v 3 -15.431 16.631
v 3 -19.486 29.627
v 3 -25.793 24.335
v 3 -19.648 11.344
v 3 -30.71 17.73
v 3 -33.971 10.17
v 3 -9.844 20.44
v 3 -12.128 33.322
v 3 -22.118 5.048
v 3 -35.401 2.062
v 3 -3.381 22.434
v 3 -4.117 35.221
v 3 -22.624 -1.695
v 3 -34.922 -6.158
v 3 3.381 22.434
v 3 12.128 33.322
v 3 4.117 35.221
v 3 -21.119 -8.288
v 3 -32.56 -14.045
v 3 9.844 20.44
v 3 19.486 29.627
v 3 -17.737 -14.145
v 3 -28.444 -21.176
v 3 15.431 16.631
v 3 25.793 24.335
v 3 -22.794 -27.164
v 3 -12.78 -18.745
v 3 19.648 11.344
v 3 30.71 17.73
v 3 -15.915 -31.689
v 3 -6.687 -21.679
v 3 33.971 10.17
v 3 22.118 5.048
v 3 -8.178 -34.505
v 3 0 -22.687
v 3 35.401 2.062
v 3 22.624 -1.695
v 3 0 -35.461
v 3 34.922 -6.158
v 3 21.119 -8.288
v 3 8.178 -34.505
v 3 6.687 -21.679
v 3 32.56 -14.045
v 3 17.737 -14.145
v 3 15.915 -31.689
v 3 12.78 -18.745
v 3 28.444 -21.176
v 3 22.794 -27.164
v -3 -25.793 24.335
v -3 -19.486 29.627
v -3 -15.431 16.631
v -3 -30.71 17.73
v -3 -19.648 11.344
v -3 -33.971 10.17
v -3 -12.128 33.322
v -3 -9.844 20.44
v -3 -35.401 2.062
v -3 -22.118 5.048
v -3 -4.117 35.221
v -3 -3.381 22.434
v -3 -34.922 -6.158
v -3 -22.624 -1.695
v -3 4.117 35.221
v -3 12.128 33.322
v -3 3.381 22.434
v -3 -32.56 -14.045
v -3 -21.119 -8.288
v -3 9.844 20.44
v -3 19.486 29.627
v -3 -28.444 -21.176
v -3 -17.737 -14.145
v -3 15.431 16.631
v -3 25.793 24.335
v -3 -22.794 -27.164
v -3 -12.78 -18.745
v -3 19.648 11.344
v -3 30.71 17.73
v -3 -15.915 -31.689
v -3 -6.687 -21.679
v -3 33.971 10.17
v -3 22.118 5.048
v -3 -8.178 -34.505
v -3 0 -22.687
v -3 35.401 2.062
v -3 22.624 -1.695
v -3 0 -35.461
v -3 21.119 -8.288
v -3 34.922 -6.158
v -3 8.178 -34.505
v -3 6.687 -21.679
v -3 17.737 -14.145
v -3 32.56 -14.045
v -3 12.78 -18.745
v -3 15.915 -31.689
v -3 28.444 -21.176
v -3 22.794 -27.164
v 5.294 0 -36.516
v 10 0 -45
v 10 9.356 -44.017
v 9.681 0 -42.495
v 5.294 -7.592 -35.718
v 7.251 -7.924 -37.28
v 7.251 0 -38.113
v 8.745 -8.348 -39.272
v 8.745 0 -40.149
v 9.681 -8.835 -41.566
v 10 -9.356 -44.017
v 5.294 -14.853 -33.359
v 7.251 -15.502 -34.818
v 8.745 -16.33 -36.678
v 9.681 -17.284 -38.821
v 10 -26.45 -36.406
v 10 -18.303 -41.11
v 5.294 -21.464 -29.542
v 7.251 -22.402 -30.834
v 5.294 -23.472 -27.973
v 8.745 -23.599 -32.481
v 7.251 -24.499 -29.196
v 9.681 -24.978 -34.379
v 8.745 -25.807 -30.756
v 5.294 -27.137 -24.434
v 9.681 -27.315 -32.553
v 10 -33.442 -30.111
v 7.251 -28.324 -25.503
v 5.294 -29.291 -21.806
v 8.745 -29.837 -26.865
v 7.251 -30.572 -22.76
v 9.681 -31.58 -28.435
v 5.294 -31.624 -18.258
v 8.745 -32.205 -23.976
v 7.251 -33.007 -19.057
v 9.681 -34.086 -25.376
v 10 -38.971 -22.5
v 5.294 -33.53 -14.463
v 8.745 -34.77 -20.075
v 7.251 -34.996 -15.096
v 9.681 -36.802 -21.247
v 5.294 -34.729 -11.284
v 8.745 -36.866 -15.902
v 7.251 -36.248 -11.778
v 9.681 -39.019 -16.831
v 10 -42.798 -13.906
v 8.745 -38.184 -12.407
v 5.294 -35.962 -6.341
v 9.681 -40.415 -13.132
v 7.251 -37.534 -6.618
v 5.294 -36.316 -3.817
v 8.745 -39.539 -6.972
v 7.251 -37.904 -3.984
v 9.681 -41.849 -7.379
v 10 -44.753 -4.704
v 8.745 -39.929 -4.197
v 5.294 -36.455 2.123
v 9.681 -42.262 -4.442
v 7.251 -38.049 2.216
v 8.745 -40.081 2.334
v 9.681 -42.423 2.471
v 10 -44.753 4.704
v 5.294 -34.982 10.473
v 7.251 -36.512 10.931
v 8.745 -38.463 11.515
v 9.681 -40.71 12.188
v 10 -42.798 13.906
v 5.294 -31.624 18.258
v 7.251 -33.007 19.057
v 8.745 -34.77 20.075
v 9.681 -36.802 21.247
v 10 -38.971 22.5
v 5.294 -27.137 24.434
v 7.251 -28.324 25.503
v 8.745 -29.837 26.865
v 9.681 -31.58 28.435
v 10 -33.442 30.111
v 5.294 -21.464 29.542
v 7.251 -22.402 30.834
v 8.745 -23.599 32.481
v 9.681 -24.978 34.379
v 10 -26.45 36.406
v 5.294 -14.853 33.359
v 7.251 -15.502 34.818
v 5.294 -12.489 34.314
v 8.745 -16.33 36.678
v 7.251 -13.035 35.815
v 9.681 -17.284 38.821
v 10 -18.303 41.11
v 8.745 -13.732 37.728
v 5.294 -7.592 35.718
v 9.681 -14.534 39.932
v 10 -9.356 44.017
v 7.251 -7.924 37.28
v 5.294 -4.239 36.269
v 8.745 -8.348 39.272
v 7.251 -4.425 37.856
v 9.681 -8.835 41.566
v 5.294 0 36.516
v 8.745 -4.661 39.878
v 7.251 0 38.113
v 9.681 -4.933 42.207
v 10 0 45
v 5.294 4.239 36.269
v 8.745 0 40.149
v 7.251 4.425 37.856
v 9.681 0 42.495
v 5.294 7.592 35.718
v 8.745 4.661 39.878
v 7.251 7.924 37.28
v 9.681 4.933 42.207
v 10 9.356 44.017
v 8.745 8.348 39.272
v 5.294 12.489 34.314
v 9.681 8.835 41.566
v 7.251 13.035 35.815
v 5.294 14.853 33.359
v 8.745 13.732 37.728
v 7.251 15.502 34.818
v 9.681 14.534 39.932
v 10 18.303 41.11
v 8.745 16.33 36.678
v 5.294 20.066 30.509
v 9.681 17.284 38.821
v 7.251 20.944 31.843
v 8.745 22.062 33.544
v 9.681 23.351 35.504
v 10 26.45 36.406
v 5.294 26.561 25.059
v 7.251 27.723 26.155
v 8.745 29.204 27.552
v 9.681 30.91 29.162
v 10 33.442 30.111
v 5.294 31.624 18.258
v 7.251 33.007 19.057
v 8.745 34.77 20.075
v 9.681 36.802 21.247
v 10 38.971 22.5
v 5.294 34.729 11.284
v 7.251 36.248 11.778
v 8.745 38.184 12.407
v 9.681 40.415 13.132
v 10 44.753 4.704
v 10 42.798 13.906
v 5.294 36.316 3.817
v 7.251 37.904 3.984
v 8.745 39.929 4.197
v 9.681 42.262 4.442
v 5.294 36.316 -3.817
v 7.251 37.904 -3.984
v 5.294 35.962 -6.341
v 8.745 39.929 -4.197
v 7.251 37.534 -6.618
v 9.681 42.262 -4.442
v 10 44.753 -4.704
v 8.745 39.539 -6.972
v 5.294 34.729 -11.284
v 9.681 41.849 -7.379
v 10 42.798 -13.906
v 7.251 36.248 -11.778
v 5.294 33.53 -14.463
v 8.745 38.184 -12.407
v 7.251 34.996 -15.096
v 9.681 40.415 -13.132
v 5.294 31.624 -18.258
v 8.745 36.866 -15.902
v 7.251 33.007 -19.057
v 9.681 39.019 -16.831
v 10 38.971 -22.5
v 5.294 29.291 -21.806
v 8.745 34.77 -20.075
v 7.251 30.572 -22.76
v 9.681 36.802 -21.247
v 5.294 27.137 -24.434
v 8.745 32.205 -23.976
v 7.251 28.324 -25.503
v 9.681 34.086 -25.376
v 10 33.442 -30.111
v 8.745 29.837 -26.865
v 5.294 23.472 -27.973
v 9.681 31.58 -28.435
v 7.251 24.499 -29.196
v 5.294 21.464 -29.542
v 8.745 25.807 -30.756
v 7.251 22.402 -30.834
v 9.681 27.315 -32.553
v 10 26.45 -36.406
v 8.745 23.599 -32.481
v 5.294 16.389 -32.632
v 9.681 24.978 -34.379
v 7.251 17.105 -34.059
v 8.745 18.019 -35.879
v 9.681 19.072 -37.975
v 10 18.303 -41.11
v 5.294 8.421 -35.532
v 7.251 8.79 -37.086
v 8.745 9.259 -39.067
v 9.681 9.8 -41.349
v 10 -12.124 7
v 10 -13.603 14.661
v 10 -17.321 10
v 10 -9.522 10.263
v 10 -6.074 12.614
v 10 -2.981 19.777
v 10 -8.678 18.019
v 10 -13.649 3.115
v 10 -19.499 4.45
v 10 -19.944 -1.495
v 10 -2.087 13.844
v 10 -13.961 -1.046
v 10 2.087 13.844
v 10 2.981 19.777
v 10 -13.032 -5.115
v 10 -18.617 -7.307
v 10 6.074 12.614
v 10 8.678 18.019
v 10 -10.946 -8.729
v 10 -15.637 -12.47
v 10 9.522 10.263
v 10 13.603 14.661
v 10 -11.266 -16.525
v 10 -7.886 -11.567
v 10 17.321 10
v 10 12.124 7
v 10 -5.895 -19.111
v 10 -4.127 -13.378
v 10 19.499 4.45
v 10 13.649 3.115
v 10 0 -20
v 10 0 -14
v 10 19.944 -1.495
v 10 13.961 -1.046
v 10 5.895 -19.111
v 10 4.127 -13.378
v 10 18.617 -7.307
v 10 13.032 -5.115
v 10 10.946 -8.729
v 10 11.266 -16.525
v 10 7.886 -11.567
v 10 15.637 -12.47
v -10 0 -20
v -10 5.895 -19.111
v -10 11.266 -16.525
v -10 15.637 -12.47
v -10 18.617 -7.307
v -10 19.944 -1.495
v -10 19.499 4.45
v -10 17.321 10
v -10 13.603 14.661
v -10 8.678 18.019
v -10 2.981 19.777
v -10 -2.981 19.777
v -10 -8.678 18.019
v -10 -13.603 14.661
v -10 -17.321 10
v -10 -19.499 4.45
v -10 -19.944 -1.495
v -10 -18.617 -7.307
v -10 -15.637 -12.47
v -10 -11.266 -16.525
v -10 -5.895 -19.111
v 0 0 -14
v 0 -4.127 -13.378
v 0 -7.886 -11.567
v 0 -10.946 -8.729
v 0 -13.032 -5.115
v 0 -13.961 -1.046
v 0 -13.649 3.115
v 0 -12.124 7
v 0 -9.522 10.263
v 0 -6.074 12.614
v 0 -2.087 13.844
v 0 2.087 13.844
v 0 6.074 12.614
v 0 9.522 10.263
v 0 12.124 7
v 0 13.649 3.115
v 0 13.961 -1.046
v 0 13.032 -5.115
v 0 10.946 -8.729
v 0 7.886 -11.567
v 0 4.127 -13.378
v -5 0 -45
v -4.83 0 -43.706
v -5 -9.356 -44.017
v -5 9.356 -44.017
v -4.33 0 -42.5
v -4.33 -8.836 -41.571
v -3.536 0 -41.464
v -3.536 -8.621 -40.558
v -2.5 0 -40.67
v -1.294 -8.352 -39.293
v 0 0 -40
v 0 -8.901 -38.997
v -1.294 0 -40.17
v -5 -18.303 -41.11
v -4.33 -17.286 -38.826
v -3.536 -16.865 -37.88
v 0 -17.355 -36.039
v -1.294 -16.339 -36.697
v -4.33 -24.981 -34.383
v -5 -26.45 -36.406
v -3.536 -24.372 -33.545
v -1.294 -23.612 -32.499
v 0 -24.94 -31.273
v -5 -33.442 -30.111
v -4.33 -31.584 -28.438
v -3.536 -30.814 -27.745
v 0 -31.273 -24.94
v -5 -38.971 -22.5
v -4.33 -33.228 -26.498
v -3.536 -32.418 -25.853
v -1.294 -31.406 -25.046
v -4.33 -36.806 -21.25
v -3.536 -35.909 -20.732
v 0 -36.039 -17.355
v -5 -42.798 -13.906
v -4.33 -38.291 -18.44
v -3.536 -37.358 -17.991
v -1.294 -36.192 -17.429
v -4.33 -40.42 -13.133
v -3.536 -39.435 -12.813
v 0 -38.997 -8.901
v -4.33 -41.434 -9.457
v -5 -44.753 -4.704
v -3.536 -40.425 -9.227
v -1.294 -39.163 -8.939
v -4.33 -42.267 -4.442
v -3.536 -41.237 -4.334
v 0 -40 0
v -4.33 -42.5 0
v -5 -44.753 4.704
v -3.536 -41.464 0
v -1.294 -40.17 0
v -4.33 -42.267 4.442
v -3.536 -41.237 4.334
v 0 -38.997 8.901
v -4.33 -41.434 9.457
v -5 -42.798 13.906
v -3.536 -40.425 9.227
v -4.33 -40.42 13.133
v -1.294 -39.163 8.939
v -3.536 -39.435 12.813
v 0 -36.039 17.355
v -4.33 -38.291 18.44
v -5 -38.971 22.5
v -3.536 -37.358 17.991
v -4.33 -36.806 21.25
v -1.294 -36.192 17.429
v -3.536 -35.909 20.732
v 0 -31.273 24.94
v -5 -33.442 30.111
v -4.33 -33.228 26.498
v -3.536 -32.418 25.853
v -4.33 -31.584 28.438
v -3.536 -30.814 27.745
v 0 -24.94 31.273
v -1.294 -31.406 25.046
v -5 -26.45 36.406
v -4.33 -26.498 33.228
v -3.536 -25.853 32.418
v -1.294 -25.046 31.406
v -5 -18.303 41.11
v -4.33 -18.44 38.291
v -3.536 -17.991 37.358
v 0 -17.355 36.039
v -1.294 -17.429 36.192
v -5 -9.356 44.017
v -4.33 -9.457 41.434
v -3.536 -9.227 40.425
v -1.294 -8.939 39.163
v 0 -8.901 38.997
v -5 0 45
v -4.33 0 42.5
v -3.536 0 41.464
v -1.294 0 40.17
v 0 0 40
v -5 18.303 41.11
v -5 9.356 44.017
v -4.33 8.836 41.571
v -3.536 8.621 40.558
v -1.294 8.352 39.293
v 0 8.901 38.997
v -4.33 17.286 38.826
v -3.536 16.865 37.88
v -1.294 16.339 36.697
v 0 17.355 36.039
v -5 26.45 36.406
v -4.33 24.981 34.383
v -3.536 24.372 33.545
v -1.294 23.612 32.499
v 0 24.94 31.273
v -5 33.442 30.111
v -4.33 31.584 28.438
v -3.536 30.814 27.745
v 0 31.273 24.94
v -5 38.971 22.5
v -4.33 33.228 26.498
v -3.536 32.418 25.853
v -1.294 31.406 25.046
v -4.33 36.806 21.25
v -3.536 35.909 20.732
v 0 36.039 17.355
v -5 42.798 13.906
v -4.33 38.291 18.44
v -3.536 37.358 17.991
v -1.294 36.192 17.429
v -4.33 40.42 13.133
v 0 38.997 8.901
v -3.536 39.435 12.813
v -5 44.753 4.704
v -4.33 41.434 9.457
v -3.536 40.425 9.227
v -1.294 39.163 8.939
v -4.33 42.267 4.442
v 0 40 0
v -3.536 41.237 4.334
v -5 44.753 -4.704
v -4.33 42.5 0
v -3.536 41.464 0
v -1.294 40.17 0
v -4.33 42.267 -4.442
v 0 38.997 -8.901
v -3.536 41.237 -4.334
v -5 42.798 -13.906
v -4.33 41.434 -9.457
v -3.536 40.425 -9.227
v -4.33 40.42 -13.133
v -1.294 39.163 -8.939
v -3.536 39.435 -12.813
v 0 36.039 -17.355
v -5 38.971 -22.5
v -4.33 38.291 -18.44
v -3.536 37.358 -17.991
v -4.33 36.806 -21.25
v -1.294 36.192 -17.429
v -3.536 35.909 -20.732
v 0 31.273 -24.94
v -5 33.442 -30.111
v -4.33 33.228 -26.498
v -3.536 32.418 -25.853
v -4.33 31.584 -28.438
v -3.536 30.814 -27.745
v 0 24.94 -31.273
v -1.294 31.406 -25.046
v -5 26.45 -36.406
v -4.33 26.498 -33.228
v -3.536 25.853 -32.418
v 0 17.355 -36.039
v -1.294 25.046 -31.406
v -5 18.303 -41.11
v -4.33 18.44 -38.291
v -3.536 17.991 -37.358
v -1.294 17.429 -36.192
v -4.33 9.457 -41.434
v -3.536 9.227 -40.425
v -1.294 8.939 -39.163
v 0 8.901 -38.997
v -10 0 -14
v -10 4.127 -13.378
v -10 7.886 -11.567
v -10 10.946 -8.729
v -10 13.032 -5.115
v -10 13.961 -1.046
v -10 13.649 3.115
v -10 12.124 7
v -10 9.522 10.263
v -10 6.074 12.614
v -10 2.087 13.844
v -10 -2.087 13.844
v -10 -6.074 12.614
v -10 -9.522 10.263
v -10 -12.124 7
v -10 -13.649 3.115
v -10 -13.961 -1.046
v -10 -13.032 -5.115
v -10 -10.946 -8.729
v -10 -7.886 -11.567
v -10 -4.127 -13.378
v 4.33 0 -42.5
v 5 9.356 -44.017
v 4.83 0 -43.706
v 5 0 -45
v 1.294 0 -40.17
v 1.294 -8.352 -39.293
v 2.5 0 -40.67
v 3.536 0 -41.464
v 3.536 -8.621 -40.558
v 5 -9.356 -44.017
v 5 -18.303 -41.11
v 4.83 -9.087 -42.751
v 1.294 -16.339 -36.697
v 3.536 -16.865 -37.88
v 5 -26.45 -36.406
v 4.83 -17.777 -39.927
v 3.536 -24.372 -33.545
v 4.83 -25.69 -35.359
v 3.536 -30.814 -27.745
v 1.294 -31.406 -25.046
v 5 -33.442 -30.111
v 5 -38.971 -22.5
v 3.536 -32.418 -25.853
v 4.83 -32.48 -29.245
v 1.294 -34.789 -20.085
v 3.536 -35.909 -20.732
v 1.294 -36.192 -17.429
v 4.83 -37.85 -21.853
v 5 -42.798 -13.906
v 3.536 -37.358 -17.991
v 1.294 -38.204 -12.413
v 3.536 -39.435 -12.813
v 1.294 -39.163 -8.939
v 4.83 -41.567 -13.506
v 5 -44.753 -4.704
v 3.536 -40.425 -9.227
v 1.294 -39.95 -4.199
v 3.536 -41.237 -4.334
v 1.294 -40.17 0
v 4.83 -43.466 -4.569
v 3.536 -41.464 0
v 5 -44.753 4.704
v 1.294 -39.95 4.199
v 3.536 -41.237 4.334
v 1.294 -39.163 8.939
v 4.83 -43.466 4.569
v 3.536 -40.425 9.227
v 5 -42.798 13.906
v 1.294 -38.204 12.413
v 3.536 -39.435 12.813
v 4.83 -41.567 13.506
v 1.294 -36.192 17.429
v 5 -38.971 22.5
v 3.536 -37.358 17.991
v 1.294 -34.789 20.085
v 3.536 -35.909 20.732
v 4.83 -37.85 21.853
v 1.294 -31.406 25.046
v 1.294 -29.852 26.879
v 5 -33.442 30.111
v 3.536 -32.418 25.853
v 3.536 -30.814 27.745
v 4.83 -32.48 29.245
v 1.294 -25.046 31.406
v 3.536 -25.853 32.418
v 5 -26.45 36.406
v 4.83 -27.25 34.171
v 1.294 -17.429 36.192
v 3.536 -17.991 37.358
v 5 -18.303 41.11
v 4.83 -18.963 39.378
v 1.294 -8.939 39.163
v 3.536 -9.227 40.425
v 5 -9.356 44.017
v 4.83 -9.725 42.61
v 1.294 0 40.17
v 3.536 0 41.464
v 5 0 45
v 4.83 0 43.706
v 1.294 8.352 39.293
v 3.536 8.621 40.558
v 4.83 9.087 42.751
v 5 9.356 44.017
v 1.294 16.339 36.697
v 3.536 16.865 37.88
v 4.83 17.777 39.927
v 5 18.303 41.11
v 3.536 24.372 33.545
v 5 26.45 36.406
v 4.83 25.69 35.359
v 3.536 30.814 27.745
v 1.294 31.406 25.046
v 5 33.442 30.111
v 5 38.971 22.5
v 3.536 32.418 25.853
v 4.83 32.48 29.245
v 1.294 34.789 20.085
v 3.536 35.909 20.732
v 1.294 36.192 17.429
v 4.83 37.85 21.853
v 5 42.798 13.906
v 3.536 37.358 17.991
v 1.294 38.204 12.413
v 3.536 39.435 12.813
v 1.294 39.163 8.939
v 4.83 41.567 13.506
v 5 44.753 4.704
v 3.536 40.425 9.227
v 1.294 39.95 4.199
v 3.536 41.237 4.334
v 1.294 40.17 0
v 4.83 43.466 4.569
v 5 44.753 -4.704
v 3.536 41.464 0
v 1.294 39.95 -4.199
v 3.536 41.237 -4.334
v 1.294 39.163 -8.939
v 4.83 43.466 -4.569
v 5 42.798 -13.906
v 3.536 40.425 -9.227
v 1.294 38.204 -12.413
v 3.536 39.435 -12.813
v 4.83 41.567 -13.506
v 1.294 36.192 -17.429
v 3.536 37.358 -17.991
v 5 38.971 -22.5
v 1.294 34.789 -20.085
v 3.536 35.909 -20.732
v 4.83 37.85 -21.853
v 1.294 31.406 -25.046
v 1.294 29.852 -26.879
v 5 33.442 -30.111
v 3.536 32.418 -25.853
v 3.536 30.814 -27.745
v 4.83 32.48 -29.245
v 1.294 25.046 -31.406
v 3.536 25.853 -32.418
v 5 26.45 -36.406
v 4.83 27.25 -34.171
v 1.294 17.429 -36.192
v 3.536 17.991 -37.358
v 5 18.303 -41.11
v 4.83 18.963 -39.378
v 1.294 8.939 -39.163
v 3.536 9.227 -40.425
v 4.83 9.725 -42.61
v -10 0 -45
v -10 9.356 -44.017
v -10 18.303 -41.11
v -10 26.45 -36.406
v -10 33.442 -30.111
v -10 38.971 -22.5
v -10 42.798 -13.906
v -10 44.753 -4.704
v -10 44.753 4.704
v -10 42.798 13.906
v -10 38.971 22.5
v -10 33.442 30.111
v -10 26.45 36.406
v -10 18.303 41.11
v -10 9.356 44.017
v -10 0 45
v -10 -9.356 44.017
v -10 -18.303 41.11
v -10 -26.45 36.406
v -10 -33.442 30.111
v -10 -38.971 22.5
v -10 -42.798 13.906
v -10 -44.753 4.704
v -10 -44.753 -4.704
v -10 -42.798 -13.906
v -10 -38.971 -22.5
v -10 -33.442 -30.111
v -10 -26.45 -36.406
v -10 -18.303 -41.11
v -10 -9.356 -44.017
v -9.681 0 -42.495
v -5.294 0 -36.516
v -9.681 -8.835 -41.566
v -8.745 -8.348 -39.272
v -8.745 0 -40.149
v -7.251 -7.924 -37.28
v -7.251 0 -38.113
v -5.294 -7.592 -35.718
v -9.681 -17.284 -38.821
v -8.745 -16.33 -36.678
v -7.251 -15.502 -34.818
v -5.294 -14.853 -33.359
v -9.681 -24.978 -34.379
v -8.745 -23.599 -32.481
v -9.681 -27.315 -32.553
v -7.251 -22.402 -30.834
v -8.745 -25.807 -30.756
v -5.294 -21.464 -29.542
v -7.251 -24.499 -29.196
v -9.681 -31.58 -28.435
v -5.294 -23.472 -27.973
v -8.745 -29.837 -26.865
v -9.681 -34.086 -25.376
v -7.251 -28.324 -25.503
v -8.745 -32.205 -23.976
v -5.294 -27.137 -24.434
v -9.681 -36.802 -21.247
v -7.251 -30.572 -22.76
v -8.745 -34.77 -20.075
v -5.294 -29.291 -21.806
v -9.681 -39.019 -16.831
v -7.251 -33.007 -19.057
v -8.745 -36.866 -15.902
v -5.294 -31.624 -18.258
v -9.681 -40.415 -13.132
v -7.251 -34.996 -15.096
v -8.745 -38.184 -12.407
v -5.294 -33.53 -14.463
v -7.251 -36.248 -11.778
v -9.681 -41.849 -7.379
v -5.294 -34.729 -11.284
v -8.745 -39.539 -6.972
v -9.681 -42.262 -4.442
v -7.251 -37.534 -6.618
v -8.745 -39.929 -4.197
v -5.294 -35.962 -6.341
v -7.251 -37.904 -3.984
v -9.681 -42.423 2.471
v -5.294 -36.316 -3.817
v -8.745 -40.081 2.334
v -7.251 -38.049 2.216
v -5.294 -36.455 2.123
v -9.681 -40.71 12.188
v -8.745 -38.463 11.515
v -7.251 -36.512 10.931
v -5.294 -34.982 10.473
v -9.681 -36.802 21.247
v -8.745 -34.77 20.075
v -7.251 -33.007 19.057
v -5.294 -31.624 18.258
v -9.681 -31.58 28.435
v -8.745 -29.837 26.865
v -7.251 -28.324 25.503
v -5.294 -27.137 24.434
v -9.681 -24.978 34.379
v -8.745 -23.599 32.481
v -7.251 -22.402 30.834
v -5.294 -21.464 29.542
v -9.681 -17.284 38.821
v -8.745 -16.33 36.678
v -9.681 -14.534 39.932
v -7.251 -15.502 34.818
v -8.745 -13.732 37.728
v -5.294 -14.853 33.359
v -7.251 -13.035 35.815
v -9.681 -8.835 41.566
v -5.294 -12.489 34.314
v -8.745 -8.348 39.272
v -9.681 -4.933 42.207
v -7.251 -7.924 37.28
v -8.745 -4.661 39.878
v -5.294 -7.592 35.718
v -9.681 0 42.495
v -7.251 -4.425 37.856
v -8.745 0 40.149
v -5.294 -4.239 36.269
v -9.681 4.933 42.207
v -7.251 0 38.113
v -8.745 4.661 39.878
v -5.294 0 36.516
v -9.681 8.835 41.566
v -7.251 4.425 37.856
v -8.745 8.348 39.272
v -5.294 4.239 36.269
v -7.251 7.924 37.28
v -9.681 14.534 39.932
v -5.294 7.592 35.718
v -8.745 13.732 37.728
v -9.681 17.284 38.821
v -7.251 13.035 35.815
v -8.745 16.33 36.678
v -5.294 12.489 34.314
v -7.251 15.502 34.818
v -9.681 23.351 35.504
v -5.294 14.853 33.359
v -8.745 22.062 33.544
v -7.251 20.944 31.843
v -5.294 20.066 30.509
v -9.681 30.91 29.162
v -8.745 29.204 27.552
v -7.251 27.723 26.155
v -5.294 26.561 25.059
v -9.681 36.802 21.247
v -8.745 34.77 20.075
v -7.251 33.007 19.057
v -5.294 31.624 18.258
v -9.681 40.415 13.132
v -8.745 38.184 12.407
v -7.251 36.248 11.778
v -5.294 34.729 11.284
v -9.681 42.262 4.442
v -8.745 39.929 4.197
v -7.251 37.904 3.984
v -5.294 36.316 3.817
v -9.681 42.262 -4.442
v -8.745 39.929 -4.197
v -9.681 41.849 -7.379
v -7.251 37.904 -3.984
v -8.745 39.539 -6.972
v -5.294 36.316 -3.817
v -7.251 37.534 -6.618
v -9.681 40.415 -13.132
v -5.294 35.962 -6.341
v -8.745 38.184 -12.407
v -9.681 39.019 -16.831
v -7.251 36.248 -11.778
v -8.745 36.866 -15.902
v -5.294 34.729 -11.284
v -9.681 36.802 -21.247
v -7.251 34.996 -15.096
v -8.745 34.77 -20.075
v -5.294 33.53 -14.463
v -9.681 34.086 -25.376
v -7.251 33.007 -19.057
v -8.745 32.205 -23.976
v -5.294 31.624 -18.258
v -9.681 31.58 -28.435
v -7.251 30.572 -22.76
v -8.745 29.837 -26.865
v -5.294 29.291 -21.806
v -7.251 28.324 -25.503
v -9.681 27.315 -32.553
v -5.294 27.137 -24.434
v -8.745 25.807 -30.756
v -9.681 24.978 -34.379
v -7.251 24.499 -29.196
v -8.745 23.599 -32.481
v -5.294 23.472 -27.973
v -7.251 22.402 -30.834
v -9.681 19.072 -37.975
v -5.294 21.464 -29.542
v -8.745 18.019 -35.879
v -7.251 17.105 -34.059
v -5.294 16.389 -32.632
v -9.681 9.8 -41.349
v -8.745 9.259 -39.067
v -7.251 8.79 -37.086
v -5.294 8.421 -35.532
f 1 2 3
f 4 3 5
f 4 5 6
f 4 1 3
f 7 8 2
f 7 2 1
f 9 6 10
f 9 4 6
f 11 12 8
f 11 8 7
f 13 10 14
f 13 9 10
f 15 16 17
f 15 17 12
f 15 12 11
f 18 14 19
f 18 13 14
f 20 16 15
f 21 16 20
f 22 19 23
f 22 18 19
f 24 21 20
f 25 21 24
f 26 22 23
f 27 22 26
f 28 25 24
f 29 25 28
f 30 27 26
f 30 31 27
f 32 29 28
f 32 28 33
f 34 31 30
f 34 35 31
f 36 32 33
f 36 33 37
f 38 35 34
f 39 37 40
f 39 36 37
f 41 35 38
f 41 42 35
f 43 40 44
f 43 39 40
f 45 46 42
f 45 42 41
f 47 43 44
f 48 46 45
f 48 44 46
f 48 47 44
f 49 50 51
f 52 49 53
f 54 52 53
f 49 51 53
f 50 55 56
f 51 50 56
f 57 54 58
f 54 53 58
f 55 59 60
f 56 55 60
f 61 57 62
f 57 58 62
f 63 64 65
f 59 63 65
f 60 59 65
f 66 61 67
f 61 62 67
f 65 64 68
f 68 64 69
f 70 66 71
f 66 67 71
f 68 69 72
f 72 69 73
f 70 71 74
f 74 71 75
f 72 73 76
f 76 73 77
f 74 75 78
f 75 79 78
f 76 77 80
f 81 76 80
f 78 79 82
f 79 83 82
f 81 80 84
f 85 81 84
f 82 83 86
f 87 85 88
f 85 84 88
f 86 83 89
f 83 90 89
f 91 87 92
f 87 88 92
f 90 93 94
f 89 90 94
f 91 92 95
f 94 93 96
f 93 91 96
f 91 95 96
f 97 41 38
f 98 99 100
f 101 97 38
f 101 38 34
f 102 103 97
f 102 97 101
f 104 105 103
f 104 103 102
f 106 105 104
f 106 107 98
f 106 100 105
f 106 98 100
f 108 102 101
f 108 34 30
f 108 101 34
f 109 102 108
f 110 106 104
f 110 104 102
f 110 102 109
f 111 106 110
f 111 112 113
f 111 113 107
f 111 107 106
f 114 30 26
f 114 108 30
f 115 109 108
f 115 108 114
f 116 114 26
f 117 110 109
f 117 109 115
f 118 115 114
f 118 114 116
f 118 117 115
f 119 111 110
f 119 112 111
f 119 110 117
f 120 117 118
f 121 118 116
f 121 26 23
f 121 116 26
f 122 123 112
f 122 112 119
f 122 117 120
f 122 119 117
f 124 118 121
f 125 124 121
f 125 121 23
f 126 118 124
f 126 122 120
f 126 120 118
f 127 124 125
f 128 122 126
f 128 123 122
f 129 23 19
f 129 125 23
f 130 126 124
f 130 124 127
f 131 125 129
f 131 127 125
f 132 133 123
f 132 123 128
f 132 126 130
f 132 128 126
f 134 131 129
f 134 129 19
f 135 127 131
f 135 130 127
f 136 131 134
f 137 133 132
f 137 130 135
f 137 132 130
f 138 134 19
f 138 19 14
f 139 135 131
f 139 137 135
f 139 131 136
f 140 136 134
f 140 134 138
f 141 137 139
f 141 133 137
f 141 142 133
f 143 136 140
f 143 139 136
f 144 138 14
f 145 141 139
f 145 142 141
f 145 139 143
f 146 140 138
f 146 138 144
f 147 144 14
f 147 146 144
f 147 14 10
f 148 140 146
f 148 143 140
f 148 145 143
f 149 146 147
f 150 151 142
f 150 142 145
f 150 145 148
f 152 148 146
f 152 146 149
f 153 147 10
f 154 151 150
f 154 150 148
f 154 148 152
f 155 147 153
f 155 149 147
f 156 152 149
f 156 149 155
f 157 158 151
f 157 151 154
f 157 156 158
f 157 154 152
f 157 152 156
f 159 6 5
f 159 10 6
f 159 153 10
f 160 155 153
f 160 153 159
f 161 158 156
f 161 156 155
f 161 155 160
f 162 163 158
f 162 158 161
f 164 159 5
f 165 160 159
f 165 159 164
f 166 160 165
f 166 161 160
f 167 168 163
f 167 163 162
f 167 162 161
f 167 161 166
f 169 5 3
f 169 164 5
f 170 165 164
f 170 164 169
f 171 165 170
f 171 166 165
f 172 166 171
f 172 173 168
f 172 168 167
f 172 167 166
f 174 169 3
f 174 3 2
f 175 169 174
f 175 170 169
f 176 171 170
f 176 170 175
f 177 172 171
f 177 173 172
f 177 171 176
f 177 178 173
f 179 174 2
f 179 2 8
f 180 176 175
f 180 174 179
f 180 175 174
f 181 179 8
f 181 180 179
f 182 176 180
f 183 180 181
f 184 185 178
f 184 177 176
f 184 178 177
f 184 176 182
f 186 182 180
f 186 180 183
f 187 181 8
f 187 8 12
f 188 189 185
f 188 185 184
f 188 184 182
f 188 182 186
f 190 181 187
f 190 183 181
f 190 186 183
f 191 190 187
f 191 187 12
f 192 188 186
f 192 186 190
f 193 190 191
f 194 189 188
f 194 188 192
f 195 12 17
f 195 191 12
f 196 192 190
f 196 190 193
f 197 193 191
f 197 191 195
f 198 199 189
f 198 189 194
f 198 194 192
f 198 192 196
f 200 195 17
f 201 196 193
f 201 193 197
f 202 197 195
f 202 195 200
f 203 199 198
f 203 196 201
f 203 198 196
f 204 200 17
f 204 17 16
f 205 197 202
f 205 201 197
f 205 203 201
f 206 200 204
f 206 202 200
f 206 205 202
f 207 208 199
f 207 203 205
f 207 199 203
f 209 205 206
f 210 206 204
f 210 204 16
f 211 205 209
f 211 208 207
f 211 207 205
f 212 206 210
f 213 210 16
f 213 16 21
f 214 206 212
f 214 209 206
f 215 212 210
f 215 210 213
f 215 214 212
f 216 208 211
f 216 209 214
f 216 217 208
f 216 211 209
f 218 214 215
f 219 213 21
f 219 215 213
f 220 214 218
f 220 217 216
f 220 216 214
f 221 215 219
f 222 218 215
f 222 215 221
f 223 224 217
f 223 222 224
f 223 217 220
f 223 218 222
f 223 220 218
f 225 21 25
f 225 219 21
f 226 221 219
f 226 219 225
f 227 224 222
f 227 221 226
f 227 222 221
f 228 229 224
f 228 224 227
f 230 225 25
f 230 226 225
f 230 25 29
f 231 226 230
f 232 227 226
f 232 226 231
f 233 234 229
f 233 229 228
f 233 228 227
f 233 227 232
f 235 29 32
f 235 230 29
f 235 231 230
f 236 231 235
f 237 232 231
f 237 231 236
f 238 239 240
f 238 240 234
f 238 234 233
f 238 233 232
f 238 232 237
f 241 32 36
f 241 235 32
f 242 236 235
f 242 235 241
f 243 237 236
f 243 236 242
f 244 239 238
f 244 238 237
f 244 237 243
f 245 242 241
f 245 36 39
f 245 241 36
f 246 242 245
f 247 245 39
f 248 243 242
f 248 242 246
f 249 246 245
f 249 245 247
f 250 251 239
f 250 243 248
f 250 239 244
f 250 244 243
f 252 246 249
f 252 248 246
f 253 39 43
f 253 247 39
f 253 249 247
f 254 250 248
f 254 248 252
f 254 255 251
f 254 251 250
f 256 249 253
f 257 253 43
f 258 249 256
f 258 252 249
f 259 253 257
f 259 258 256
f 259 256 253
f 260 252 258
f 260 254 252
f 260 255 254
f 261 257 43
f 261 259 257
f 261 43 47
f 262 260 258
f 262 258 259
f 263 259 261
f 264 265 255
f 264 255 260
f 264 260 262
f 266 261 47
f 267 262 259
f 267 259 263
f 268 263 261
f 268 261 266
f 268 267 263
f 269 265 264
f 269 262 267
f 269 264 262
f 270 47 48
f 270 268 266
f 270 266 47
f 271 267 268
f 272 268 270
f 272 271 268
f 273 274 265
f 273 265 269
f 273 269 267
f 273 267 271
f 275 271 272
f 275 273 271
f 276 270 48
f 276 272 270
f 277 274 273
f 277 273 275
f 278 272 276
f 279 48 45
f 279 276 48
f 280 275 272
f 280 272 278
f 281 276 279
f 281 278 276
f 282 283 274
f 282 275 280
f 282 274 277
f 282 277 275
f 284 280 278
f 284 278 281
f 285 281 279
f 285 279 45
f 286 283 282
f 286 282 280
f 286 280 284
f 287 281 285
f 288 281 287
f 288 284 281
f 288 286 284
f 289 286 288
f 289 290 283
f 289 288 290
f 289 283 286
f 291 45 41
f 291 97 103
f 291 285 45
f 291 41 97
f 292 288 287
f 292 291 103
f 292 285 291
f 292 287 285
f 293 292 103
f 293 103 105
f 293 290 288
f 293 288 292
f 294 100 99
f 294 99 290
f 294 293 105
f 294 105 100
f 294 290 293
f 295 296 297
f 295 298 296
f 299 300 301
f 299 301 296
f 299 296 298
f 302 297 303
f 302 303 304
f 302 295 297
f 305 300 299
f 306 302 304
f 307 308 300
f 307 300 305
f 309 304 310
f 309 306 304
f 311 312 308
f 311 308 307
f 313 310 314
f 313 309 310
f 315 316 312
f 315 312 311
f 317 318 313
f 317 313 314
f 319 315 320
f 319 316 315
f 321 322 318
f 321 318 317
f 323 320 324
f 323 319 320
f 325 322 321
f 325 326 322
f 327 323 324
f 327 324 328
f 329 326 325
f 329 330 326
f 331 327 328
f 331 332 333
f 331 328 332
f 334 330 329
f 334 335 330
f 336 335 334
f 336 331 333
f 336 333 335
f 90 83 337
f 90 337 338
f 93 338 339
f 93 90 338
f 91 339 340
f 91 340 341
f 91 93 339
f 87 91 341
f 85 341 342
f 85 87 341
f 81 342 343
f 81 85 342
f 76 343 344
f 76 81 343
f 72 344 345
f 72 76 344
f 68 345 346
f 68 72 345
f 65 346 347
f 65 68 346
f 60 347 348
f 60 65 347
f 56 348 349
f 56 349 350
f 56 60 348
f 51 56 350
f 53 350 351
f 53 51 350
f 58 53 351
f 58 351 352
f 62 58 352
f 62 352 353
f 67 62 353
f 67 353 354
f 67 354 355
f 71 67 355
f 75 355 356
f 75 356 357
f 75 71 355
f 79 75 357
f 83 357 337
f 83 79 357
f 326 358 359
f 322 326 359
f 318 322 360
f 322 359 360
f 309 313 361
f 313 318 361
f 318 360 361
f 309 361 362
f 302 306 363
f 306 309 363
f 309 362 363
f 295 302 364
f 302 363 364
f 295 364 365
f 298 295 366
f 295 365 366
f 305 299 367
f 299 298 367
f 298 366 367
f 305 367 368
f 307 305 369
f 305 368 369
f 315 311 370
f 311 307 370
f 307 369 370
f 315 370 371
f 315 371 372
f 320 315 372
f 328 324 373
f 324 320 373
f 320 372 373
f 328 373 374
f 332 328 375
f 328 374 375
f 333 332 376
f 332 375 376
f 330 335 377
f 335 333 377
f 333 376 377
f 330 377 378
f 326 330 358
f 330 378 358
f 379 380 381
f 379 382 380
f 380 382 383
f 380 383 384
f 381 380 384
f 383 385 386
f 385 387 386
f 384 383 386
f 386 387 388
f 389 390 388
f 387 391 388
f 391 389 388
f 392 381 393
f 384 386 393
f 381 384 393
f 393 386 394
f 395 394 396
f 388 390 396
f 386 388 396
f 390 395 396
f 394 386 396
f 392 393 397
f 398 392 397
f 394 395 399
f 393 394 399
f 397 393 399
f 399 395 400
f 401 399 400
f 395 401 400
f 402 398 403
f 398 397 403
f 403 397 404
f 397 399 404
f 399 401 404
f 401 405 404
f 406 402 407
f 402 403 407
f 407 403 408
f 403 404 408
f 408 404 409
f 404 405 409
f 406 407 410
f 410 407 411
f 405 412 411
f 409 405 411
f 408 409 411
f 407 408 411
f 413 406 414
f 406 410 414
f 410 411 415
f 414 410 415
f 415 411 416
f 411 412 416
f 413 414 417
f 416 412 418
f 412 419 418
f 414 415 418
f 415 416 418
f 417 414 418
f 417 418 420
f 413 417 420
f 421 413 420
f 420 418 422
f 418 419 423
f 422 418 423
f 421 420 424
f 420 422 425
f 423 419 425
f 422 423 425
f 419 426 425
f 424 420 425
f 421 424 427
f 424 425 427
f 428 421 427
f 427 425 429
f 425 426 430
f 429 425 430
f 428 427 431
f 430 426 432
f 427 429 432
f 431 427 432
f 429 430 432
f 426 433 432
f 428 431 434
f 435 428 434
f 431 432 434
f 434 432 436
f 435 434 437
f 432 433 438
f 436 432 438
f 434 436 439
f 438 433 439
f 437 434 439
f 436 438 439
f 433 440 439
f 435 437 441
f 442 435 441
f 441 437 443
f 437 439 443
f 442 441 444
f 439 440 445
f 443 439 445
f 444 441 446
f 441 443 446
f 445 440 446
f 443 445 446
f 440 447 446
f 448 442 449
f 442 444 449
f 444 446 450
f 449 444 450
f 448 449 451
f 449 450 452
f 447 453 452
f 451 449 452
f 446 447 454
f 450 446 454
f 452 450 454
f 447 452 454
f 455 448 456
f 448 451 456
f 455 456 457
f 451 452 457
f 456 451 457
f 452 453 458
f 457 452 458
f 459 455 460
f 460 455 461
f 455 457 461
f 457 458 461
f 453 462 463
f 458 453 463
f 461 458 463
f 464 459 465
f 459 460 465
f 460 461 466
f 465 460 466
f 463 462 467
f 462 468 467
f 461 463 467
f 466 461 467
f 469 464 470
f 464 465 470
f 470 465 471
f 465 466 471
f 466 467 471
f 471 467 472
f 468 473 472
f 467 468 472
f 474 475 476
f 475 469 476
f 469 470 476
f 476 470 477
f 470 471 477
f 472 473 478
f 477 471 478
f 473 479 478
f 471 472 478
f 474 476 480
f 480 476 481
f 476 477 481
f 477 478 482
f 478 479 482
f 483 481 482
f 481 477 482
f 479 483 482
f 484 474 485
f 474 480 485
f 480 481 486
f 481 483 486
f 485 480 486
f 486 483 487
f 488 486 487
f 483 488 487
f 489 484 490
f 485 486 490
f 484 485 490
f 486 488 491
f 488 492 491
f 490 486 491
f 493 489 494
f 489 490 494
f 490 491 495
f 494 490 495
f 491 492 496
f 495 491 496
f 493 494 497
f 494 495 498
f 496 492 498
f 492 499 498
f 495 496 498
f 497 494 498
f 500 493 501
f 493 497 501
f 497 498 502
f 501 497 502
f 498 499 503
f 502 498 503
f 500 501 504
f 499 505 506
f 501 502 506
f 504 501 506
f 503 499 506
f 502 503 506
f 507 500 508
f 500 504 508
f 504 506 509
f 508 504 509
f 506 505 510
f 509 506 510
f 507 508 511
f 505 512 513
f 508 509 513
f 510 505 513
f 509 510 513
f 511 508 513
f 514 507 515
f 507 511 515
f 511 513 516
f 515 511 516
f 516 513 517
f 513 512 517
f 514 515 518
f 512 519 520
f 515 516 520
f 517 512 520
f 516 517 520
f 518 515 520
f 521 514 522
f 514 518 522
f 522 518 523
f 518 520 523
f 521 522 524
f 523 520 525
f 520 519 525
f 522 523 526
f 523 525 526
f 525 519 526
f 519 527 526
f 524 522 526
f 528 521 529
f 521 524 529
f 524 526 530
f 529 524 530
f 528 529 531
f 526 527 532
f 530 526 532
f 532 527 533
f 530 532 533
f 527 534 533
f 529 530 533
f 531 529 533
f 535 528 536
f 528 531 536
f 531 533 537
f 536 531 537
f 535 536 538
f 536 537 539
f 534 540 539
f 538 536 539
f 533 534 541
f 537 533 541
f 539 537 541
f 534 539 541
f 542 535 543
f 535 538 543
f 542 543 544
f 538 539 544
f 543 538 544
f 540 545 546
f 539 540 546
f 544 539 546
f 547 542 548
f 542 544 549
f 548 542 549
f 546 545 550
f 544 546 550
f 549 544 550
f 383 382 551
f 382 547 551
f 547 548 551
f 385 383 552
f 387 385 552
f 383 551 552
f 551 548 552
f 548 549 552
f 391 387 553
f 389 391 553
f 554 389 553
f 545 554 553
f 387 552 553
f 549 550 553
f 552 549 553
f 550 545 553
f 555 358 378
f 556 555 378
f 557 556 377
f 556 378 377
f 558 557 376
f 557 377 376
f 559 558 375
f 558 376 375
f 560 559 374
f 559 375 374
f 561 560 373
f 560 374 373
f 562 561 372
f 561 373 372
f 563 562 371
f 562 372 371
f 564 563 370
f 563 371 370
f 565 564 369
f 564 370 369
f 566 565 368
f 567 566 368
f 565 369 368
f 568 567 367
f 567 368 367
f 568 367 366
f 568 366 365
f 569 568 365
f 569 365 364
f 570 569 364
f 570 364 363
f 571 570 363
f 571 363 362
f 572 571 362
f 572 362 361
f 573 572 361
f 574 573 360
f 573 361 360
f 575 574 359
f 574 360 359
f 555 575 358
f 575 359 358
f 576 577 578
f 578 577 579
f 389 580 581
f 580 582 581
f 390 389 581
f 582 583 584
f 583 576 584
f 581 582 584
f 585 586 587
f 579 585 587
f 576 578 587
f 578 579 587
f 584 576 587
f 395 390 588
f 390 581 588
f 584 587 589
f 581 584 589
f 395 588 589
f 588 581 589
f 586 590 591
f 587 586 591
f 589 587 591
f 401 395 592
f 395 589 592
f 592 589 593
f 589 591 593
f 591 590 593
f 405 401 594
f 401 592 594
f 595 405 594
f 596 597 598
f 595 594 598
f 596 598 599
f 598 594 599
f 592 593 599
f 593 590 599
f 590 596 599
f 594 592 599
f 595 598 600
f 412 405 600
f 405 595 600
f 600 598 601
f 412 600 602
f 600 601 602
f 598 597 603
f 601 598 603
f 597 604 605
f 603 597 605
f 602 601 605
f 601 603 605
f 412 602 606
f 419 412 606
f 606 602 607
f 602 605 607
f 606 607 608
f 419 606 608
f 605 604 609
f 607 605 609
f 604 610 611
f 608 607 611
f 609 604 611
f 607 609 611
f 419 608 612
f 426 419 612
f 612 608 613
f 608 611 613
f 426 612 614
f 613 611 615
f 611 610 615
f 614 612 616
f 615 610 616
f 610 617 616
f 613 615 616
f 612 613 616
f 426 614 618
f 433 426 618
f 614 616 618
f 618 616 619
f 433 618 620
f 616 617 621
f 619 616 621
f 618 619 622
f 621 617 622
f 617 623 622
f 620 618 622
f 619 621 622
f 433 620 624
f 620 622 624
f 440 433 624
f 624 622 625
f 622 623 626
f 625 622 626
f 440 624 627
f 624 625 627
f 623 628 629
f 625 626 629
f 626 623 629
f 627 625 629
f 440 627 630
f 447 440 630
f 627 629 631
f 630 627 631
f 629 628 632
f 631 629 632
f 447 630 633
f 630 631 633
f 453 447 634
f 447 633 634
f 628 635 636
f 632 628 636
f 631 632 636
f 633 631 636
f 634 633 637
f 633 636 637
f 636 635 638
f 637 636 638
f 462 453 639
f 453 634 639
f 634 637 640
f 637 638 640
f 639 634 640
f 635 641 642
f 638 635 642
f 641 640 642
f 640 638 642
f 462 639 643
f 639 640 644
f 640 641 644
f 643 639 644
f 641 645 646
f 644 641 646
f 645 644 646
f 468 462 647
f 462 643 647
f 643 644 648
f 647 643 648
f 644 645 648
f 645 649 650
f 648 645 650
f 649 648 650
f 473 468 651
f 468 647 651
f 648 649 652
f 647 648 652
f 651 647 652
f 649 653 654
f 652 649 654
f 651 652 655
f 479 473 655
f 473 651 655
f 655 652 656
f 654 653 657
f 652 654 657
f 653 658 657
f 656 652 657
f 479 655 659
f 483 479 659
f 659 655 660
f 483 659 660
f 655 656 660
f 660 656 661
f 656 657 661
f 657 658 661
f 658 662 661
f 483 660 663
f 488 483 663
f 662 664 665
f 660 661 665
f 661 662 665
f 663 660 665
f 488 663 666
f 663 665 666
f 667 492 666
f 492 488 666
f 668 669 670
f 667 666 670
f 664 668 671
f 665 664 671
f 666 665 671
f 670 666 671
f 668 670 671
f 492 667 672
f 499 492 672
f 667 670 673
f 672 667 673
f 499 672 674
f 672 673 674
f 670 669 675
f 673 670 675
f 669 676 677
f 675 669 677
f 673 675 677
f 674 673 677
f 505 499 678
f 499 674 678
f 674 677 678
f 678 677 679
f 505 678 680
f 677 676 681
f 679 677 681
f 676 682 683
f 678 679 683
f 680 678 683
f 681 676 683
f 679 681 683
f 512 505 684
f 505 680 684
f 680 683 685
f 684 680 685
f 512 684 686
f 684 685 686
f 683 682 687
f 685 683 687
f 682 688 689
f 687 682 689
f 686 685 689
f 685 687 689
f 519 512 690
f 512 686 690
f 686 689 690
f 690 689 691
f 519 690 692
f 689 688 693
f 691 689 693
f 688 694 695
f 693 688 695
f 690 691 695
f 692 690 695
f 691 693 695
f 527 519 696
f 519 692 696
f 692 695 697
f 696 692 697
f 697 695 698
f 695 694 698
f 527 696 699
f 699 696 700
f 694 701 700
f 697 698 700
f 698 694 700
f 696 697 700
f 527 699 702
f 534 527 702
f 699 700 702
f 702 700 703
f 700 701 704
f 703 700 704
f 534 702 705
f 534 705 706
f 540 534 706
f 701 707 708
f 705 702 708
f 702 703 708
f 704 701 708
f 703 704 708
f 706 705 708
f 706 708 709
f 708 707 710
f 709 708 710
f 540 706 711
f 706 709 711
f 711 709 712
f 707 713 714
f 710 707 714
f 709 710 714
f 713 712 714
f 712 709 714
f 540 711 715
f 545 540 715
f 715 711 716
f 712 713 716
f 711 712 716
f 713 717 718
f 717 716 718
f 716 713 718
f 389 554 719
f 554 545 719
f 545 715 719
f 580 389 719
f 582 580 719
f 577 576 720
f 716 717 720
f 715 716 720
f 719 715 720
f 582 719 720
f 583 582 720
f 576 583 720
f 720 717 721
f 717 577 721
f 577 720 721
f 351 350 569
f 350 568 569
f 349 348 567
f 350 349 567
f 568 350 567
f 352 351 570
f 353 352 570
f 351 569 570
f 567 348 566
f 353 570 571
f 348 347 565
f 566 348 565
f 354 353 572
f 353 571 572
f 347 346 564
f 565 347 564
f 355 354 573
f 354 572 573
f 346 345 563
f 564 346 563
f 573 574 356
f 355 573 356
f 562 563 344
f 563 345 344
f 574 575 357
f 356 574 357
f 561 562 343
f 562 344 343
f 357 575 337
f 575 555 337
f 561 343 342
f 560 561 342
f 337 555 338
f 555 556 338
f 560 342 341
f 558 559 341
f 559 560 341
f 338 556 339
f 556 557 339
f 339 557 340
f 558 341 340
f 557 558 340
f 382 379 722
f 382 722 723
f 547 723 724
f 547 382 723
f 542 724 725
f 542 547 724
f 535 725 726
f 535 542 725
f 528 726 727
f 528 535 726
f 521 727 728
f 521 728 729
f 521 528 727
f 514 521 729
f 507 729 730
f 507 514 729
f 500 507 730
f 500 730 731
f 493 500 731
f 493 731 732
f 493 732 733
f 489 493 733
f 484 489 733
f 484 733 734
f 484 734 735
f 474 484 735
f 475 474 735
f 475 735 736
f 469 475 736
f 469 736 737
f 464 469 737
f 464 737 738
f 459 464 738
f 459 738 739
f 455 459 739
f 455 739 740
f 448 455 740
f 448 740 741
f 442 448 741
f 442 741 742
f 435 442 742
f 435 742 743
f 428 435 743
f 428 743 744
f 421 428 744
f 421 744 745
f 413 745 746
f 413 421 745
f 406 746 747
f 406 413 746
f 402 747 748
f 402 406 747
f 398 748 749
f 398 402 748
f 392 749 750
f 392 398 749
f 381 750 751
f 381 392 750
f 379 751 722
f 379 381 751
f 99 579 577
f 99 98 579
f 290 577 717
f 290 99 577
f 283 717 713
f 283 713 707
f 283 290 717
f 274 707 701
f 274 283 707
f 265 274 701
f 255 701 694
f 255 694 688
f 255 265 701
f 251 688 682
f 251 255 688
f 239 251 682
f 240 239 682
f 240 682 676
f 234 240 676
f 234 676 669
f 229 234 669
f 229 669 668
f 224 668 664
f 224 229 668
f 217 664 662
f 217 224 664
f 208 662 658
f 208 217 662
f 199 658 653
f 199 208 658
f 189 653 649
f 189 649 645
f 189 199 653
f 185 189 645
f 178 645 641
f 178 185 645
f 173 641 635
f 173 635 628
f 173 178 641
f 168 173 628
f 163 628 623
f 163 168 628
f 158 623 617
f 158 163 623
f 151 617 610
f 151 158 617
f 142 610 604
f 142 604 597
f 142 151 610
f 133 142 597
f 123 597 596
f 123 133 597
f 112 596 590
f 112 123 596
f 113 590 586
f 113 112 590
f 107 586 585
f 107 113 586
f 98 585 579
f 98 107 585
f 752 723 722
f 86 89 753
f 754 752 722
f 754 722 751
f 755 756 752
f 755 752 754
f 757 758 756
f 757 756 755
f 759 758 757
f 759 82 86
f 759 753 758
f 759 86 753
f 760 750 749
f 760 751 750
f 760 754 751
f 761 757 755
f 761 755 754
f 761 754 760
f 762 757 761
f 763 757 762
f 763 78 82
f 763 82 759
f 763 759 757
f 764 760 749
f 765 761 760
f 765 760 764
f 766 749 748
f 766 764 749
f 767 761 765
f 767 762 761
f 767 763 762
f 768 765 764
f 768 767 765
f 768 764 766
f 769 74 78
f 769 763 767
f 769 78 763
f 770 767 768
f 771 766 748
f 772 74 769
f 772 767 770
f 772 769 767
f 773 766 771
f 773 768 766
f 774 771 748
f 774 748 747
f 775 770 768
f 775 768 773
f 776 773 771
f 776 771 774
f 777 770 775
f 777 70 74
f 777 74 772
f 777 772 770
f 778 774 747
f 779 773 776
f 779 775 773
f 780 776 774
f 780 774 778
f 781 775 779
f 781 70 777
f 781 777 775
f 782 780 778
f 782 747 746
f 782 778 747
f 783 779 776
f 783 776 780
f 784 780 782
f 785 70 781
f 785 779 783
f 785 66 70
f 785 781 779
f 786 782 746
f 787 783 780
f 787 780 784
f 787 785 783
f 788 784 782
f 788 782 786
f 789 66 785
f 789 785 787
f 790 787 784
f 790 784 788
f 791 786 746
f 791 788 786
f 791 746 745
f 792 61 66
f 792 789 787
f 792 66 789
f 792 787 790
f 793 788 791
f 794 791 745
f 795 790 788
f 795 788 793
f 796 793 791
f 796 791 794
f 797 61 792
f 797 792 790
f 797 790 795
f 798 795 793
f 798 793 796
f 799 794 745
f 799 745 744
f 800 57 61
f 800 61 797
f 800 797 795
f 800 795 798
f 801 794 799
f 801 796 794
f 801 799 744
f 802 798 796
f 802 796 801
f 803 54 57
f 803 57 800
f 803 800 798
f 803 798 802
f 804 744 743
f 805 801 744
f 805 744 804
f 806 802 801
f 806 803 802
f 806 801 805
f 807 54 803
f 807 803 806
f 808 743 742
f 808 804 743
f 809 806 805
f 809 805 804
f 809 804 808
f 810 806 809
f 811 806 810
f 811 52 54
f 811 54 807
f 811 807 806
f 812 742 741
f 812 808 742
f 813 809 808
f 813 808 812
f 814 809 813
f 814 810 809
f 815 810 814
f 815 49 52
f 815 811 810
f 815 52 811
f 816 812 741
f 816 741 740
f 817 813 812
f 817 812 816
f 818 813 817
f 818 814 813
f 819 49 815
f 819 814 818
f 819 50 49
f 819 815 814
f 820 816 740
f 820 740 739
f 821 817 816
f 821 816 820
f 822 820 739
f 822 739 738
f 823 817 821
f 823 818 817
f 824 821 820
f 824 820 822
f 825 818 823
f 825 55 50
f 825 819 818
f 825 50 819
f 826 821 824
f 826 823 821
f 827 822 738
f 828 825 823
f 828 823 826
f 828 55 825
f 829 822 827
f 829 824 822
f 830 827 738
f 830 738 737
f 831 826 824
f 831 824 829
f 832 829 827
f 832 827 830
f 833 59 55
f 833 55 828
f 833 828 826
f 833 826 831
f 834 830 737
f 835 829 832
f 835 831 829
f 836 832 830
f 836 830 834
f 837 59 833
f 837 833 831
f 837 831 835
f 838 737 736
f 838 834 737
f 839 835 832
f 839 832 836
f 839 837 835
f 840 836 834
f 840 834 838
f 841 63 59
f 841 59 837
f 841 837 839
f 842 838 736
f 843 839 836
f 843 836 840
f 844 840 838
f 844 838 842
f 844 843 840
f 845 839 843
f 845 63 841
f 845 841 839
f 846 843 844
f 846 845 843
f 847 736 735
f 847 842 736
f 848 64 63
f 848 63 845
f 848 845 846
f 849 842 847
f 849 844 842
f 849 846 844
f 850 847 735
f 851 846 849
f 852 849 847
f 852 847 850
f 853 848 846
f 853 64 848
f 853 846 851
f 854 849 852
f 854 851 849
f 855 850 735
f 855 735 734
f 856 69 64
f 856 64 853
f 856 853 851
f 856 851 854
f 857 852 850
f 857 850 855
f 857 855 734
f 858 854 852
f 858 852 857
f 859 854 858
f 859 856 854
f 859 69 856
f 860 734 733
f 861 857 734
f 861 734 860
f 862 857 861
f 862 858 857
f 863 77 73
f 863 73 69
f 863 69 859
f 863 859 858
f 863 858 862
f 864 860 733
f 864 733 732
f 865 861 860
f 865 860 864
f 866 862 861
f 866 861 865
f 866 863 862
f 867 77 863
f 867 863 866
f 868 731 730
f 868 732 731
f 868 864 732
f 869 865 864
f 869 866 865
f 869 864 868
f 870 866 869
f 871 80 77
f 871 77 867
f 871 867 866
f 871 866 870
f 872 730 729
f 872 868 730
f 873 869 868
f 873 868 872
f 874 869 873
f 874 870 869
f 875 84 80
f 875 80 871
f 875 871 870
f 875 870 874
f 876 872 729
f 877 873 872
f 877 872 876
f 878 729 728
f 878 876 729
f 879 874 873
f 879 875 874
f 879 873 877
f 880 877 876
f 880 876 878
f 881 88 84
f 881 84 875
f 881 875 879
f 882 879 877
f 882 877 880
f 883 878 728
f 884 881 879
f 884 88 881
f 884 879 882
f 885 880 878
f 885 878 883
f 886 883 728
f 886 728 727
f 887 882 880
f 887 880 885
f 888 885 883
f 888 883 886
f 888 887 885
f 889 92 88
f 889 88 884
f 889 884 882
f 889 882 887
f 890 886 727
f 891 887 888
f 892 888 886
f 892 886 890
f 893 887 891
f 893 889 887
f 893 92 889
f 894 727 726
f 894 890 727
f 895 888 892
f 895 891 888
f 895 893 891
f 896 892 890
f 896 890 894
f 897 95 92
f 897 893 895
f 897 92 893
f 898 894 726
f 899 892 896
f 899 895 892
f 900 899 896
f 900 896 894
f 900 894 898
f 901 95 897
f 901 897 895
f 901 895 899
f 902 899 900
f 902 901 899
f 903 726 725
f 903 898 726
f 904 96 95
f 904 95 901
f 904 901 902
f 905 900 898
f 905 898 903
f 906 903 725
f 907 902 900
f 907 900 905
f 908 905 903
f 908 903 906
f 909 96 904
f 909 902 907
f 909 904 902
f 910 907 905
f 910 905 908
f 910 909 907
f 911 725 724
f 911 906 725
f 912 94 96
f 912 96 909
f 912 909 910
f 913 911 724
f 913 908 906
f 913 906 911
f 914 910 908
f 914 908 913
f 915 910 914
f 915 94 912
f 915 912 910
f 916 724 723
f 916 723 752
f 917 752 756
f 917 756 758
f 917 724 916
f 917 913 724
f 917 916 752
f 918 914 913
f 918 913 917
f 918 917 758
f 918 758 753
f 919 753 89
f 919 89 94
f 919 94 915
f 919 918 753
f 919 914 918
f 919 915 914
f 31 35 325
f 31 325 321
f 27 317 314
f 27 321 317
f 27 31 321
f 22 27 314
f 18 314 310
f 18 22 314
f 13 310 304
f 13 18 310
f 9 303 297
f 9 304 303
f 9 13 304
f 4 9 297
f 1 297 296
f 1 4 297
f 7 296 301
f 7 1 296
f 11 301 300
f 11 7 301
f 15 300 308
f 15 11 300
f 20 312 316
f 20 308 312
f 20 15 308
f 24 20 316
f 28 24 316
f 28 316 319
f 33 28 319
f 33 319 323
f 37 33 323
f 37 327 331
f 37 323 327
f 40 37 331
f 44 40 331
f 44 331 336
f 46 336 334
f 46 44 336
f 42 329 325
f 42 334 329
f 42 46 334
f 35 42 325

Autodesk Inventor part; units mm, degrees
ref_plane "YZ Plane" through (0, 0, 0) normal (1, 0, 0) x (0, 1, 0)
ref_plane "XZ Plane" through (0, 0, 0) normal (0, 1, 0) x (-1, 0, 0)
ref_plane "XY Plane" through (0, 0, 0) normal (0, 0, 1) x (1, 0, 0)
sketch "Náčrt1" plane through (0, 0, 0) normal (0, 1, 0) x (-1, 0, 0)
  line L0 (10, -14) -> (0, -14)
  line L1 (10, -14) -> (10, -20)
  line L2 (10, -20) -> (3, -22.687)
  line L3 (3, -22.687) -> (3, -35.4606)
  line L4 (0, 0) -> (-43.8955, 0)
  arc A0 (10, -45) -> (3, -35.4606) centre (0, -45) ccw
  line L5 (0, 0) -> (0, -73.1539)
  line L6 (10, -45) -> (5, -45)
  arc A1 (5, -45) -> (0, -40) centre (0, -45) ccw
  line L7 (24.648, -45) -> (-37.389, -45)
  line L8 (10, -45) -> (10, -56.6969)
  line L9 (-10, -14) -> (0, -14)
  line L10 (-10, -14) -> (-10, -20)
  line L11 (-10, -20) -> (-3, -22.687)
  line L12 (-3, -22.687) -> (-3, -35.4606)
  arc A2 (-3, -35.4606) -> (-10, -45) centre (0, -45) ccw
  line L13 (-10, -45) -> (-5, -45)
  arc A3 (0, -40) -> (-5, -45) centre (0, -45) ccw
  point P0 (0, -53)
  dimension "d1" = 111
  dimension "d3" = 28
  dimension "d63" = 10
  dimension "d64" = 5
  dimension "d65" = 6
  dimension "d67" = 80
  dimension "d68" = 6
revolve "Rotace1" add sketch "Náčrt1" angle 360 about axis through (0, 0, 0) along (1, 0, 0) contours L1 L2 L3 A0 L6 A1 L5 L0 | L5 A3 L7 A2 L12 L11 L10 L9
properties part number "kladka"
